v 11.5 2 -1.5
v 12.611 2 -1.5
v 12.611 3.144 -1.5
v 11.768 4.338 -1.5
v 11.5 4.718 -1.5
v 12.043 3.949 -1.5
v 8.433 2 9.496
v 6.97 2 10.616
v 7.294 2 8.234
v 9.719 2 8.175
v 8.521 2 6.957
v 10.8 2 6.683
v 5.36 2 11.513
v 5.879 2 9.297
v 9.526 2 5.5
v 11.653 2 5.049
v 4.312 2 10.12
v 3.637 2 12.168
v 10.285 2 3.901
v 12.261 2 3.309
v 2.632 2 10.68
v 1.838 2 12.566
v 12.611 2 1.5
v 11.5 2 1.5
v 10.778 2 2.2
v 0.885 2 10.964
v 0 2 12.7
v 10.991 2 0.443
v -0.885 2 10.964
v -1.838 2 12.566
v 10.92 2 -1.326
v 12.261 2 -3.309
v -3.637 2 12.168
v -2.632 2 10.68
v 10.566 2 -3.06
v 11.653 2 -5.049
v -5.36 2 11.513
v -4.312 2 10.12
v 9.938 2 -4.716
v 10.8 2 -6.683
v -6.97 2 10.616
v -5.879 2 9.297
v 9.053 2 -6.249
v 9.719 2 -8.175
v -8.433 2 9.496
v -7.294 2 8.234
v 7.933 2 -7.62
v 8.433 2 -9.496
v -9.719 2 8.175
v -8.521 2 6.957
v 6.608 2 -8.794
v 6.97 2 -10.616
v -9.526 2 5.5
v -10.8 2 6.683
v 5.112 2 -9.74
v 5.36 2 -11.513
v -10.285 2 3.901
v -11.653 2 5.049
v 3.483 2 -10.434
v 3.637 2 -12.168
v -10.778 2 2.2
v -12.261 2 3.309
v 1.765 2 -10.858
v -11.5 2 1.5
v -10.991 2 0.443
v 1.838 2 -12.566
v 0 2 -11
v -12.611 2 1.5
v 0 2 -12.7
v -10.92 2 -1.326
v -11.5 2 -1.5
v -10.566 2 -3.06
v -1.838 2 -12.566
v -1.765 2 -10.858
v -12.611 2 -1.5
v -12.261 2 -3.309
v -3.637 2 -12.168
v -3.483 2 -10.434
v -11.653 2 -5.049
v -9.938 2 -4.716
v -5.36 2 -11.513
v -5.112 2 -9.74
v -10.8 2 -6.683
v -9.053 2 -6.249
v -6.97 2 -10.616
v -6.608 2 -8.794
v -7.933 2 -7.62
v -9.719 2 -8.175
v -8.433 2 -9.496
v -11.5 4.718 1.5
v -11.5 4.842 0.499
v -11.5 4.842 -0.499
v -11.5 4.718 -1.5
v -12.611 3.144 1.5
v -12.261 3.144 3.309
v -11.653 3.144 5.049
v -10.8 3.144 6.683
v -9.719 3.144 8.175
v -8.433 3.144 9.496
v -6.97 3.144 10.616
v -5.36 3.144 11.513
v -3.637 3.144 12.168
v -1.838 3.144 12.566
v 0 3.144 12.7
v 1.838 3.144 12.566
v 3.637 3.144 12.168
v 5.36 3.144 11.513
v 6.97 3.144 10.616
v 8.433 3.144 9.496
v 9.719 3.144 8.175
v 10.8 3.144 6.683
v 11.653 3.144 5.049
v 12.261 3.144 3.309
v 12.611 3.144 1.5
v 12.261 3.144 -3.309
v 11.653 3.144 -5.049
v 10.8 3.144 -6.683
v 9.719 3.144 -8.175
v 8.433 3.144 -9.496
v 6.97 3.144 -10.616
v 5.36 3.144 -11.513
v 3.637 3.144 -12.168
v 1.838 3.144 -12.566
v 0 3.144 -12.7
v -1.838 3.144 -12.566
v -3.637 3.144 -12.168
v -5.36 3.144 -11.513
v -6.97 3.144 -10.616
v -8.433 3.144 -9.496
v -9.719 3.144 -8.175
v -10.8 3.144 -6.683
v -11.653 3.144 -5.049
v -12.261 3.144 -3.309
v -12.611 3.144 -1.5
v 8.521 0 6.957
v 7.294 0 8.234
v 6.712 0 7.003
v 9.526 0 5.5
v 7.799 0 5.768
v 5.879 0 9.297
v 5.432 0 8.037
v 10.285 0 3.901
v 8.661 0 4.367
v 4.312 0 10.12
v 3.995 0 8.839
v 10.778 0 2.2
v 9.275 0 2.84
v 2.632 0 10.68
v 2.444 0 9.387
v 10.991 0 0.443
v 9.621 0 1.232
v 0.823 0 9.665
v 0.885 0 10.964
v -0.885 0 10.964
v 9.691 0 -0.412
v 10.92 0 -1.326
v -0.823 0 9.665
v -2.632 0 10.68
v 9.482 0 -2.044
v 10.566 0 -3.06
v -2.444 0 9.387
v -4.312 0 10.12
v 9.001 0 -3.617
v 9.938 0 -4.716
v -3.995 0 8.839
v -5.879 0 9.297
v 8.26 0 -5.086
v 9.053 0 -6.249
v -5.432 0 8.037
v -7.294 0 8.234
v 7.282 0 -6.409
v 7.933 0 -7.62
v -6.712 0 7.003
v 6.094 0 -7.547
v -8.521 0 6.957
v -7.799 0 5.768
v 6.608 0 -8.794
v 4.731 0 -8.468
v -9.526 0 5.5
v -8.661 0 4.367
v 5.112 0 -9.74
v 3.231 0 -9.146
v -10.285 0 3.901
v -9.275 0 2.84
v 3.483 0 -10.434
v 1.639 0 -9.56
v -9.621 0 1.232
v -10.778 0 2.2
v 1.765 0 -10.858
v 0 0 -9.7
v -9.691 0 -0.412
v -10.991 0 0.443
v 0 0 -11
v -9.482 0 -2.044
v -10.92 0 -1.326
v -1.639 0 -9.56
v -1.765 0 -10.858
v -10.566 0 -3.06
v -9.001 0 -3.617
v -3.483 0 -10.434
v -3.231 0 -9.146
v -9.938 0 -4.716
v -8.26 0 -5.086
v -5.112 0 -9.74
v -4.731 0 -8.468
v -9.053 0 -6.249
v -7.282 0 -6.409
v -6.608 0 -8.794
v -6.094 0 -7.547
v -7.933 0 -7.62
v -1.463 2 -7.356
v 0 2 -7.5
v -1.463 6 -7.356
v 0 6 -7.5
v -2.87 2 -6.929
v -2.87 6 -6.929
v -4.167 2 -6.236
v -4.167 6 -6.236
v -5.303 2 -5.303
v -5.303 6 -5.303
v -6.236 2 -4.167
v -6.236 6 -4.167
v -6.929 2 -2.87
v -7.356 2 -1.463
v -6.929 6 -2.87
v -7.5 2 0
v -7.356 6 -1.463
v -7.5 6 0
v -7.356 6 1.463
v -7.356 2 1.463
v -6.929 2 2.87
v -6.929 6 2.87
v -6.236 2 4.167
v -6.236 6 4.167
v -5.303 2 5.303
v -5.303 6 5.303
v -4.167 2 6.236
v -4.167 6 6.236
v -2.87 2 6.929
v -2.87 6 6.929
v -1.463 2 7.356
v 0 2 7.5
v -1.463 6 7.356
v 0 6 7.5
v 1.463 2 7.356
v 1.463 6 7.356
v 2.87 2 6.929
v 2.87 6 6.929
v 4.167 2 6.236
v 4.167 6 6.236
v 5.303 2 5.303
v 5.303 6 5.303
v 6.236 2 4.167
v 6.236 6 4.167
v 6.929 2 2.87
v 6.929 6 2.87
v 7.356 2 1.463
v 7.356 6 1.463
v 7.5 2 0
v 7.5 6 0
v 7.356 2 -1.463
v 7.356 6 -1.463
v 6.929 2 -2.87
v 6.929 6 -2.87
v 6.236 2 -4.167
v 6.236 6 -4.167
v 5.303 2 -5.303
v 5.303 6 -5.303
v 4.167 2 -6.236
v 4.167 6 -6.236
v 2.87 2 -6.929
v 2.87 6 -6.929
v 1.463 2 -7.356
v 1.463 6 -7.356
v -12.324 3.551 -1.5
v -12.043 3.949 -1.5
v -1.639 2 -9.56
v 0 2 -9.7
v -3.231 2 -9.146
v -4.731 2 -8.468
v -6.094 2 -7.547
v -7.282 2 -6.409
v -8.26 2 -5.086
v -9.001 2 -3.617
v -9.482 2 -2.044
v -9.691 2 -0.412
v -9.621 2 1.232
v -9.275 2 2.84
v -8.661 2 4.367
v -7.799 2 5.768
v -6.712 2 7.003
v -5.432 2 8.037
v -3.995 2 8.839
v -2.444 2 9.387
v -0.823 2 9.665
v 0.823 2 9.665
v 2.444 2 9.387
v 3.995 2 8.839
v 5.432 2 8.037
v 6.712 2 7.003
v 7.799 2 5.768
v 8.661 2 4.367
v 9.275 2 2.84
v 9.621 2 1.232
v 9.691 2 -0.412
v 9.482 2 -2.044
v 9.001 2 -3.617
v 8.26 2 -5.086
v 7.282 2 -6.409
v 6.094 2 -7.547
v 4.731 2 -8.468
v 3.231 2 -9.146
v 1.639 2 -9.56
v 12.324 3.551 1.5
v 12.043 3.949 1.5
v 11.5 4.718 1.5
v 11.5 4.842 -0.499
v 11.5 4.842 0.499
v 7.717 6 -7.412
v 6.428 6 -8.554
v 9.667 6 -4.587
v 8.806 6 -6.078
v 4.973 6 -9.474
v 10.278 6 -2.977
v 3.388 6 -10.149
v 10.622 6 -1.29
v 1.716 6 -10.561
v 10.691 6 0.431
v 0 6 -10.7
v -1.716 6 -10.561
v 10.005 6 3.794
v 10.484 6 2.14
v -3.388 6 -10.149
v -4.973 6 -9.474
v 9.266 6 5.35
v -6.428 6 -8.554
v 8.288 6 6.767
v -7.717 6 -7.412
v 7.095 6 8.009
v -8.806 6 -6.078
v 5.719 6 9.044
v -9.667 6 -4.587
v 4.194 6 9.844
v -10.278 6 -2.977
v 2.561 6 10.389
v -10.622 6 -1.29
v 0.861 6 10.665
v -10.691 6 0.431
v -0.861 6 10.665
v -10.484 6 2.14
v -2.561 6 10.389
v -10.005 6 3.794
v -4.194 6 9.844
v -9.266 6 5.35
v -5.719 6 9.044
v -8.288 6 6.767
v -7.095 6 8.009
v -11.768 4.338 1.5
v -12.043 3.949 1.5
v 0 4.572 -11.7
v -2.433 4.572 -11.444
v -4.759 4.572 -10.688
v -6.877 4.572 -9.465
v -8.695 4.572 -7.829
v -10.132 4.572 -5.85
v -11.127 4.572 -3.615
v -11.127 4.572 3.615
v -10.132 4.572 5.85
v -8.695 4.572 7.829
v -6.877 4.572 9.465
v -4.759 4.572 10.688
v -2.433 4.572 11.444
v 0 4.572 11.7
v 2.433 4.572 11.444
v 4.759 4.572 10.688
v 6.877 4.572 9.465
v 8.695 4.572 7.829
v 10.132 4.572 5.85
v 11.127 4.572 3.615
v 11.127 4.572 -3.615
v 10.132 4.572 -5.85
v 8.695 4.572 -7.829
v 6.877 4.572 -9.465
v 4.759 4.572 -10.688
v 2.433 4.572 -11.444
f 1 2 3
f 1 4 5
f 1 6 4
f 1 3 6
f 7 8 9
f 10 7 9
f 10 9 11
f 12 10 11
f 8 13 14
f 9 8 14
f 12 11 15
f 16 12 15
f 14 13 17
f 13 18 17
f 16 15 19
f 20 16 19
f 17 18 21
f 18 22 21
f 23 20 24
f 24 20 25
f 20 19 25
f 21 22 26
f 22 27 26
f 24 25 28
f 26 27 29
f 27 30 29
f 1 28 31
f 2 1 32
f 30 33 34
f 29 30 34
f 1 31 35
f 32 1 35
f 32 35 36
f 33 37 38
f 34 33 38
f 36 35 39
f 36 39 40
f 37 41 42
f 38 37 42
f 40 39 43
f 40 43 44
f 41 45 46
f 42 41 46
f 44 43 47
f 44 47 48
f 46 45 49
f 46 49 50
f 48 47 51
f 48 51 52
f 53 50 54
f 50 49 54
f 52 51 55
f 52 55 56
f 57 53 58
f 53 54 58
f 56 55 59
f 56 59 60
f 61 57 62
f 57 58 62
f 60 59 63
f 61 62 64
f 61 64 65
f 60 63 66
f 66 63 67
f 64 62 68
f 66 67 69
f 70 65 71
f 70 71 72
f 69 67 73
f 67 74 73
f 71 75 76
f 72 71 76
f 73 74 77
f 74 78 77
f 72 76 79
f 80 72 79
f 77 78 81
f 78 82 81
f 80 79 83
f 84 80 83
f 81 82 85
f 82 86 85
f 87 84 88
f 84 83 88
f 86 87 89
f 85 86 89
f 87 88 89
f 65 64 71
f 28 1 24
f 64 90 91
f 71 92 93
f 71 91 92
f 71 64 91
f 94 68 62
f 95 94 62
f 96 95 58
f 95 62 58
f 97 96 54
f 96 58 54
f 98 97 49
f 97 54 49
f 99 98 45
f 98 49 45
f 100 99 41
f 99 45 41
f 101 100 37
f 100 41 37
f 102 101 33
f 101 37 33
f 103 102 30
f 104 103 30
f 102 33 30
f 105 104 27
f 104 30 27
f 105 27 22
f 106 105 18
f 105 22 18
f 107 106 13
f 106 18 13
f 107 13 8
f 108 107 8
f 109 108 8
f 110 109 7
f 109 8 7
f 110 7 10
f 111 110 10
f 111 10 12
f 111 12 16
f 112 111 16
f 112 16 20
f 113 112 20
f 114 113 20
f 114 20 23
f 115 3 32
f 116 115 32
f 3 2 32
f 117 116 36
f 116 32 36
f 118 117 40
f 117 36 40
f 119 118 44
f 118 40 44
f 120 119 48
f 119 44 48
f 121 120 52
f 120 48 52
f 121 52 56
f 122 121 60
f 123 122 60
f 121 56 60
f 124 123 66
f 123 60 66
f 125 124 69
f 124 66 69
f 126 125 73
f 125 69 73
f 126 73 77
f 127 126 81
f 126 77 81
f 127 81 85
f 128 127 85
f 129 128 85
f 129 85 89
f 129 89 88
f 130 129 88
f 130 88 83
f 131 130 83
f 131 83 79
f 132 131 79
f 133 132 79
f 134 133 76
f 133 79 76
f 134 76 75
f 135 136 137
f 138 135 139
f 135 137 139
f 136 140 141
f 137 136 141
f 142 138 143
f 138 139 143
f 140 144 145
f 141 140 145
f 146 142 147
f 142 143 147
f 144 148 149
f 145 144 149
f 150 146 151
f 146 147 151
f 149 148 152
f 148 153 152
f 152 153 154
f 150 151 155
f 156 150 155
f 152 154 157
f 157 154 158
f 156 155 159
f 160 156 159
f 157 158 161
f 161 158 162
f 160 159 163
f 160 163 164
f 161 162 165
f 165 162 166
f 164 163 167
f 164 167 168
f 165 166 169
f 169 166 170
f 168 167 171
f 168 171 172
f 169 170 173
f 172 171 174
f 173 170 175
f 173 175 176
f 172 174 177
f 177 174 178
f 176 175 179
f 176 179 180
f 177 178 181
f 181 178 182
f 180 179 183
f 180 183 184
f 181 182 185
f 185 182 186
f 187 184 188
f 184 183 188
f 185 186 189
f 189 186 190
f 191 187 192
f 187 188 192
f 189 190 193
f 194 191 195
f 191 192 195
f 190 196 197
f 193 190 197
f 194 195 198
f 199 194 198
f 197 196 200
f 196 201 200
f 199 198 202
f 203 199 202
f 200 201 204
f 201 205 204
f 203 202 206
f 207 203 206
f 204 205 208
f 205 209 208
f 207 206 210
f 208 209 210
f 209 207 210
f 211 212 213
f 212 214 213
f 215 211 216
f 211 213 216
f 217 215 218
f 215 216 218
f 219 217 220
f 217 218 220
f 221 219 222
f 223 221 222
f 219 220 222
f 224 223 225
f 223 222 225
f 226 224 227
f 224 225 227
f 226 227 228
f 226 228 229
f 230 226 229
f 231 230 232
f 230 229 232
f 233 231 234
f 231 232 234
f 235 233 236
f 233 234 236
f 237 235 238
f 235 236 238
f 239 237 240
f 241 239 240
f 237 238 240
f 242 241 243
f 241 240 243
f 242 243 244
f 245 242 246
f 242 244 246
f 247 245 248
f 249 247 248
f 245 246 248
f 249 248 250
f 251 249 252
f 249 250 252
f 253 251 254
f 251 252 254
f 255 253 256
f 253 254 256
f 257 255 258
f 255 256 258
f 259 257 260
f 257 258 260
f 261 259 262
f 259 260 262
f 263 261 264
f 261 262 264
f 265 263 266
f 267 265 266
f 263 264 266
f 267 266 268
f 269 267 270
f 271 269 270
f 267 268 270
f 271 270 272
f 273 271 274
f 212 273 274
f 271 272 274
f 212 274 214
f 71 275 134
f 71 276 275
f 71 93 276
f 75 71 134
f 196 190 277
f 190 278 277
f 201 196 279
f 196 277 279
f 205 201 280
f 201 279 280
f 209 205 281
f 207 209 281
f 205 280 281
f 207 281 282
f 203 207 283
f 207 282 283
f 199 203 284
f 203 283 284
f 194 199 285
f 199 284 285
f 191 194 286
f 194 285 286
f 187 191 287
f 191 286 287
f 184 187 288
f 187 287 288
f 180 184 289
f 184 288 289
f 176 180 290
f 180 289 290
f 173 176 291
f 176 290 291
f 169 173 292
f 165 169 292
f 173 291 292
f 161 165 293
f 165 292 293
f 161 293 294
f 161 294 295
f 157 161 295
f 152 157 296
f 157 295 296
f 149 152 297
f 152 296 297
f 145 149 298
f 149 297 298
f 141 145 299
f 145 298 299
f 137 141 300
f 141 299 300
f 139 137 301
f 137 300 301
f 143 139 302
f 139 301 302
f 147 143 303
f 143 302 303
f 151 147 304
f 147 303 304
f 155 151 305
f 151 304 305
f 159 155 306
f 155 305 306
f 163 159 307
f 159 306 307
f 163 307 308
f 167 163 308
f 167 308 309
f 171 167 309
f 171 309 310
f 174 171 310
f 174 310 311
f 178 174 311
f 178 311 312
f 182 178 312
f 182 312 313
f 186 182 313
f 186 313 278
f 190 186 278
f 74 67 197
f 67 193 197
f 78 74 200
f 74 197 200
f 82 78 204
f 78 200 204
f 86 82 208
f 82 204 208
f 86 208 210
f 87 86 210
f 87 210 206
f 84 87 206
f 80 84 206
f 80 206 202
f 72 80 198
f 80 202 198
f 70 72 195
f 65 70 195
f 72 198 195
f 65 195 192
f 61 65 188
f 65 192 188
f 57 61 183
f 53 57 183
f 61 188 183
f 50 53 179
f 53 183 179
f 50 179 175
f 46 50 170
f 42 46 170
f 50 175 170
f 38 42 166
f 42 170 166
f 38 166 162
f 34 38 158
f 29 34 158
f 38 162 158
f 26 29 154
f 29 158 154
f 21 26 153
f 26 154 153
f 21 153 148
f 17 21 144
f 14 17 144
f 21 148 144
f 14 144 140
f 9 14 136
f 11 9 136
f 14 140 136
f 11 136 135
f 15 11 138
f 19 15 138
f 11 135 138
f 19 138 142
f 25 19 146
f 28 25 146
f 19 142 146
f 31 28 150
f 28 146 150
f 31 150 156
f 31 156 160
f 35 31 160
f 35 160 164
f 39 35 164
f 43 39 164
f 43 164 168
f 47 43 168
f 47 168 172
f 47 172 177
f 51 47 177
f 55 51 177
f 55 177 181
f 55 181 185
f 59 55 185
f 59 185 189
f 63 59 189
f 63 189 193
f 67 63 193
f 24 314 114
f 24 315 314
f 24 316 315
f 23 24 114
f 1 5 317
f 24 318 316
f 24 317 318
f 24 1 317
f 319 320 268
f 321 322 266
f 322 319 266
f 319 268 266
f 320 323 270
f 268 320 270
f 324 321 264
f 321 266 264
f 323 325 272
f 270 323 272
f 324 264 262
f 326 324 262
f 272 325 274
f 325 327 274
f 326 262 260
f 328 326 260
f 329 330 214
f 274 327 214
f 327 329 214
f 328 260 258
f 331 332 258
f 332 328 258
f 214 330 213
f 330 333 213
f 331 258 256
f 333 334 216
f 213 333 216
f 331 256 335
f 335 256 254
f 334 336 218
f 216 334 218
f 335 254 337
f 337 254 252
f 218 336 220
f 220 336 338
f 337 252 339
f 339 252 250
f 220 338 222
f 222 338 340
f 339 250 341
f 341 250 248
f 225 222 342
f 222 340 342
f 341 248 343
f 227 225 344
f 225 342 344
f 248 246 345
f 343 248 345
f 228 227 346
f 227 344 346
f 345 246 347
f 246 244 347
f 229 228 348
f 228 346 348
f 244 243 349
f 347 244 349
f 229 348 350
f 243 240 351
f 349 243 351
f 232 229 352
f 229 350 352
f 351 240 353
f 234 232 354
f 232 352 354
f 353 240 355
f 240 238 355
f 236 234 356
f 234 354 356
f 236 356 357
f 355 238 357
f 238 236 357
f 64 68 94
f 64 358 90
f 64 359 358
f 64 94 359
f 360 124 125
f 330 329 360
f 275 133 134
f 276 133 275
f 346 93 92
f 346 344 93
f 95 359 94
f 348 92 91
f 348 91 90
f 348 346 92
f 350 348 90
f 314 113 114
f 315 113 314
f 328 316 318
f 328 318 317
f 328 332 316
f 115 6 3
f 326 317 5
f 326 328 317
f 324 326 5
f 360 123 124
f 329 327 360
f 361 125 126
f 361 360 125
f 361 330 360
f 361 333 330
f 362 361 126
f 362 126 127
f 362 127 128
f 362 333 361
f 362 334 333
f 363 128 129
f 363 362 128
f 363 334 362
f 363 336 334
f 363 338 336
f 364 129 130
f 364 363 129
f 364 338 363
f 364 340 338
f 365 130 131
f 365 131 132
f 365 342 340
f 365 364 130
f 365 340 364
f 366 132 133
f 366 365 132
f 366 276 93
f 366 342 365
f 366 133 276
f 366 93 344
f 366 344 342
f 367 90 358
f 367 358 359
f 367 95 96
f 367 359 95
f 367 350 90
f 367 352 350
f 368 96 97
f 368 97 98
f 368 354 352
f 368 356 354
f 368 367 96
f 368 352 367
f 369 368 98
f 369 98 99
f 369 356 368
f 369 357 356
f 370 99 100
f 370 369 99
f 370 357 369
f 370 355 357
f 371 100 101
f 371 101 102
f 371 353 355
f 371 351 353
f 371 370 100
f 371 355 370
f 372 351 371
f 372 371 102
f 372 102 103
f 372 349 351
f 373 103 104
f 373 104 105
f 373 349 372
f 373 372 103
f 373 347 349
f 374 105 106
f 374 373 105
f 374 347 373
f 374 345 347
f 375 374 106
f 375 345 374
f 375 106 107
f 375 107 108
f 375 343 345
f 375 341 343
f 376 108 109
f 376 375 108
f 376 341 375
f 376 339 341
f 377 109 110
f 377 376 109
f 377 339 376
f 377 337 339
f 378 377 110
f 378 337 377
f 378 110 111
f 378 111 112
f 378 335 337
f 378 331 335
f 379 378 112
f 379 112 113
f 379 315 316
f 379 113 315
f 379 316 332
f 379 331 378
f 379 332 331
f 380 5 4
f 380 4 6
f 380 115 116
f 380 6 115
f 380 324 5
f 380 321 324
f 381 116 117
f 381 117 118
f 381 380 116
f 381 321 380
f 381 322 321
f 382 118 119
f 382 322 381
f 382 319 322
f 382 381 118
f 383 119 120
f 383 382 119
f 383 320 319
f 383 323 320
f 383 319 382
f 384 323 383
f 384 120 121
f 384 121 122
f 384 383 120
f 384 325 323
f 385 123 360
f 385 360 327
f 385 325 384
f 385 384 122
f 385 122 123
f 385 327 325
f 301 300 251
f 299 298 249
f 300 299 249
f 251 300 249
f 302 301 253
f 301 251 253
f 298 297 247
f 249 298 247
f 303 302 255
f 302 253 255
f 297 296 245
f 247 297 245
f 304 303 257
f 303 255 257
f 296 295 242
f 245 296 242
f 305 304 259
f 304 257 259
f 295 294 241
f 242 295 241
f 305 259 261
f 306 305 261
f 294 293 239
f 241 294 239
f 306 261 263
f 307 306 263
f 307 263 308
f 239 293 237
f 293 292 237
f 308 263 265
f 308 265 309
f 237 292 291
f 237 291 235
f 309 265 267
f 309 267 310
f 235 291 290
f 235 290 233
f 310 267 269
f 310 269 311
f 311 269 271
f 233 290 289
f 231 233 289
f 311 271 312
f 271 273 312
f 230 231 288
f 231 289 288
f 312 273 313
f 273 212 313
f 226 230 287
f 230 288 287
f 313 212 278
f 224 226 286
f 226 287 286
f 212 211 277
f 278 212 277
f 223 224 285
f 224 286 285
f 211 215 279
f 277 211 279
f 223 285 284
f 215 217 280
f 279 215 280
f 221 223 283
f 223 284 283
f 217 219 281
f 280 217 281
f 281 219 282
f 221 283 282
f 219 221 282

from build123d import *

# Parameters (mm, degrees)
CUT_EXTRUDE1_DEPTH = 19.936208702


with BuildPart() as part:
    # Sketch1 → Revolve1 (revolve)
    with BuildSketch(Plane.XY, mode=Mode.PRIVATE) as revolve1_sk:
        Polygon((-12.7, 2), (-11, 2), (-11, 0), (-9.7, 0), (-9.7, 2), (-7.5, 2), (-7.5, 6), (-10.7, 6), (-10.7, 3.143703987), (-12.7, 3.143703987), align=None)
        Polygon((-12.7, 3.143703987), (-10.7, 6), (-10.7, 3.143703987), align=None)
    revolve(revolve1_sk.sketch.rotate(Axis((0, 0, 0), (0, 1, 0)), 270), axis=Axis((0, 0, 0), (0, 1, 0)))

    # Sketch2 → Cut-Extrude1 (cut, through all)
    with BuildSketch(Plane(origin=(0, 0, 0), x_dir=(1, 0, 0), z_dir=(0, 1, 0))):
        with BuildLine():
            Line((-11.5, -1.5), (-11.5, 1.5))
            Line((-11.5, 1.5), (-12.611106216, 1.5))
            ThreePointArc((-12.611106216, 1.5), (-12.7, 0), (-12.611106216, -1.5))
            Line((-12.611106216, -1.5), (-11.5, -1.5))
        make_face()
        with BuildLine():
            ThreePointArc((12.7, 0), (12.677757076, 0.751315863), (12.611106216, 1.5))
            Line((12.611106216, 1.5), (11.5, 1.5))
            Line((11.5, 1.5), (11.5, -1.5))
            Line((11.5, -1.5), (12.611106216, -1.5))
            ThreePointArc((12.611106216, -1.5), (12.677757076, -0.751315863), (12.7, 0))
        make_face()
    extrude(amount=CUT_EXTRUDE1_DEPTH, mode=Mode.SUBTRACT)


solid = part.part
